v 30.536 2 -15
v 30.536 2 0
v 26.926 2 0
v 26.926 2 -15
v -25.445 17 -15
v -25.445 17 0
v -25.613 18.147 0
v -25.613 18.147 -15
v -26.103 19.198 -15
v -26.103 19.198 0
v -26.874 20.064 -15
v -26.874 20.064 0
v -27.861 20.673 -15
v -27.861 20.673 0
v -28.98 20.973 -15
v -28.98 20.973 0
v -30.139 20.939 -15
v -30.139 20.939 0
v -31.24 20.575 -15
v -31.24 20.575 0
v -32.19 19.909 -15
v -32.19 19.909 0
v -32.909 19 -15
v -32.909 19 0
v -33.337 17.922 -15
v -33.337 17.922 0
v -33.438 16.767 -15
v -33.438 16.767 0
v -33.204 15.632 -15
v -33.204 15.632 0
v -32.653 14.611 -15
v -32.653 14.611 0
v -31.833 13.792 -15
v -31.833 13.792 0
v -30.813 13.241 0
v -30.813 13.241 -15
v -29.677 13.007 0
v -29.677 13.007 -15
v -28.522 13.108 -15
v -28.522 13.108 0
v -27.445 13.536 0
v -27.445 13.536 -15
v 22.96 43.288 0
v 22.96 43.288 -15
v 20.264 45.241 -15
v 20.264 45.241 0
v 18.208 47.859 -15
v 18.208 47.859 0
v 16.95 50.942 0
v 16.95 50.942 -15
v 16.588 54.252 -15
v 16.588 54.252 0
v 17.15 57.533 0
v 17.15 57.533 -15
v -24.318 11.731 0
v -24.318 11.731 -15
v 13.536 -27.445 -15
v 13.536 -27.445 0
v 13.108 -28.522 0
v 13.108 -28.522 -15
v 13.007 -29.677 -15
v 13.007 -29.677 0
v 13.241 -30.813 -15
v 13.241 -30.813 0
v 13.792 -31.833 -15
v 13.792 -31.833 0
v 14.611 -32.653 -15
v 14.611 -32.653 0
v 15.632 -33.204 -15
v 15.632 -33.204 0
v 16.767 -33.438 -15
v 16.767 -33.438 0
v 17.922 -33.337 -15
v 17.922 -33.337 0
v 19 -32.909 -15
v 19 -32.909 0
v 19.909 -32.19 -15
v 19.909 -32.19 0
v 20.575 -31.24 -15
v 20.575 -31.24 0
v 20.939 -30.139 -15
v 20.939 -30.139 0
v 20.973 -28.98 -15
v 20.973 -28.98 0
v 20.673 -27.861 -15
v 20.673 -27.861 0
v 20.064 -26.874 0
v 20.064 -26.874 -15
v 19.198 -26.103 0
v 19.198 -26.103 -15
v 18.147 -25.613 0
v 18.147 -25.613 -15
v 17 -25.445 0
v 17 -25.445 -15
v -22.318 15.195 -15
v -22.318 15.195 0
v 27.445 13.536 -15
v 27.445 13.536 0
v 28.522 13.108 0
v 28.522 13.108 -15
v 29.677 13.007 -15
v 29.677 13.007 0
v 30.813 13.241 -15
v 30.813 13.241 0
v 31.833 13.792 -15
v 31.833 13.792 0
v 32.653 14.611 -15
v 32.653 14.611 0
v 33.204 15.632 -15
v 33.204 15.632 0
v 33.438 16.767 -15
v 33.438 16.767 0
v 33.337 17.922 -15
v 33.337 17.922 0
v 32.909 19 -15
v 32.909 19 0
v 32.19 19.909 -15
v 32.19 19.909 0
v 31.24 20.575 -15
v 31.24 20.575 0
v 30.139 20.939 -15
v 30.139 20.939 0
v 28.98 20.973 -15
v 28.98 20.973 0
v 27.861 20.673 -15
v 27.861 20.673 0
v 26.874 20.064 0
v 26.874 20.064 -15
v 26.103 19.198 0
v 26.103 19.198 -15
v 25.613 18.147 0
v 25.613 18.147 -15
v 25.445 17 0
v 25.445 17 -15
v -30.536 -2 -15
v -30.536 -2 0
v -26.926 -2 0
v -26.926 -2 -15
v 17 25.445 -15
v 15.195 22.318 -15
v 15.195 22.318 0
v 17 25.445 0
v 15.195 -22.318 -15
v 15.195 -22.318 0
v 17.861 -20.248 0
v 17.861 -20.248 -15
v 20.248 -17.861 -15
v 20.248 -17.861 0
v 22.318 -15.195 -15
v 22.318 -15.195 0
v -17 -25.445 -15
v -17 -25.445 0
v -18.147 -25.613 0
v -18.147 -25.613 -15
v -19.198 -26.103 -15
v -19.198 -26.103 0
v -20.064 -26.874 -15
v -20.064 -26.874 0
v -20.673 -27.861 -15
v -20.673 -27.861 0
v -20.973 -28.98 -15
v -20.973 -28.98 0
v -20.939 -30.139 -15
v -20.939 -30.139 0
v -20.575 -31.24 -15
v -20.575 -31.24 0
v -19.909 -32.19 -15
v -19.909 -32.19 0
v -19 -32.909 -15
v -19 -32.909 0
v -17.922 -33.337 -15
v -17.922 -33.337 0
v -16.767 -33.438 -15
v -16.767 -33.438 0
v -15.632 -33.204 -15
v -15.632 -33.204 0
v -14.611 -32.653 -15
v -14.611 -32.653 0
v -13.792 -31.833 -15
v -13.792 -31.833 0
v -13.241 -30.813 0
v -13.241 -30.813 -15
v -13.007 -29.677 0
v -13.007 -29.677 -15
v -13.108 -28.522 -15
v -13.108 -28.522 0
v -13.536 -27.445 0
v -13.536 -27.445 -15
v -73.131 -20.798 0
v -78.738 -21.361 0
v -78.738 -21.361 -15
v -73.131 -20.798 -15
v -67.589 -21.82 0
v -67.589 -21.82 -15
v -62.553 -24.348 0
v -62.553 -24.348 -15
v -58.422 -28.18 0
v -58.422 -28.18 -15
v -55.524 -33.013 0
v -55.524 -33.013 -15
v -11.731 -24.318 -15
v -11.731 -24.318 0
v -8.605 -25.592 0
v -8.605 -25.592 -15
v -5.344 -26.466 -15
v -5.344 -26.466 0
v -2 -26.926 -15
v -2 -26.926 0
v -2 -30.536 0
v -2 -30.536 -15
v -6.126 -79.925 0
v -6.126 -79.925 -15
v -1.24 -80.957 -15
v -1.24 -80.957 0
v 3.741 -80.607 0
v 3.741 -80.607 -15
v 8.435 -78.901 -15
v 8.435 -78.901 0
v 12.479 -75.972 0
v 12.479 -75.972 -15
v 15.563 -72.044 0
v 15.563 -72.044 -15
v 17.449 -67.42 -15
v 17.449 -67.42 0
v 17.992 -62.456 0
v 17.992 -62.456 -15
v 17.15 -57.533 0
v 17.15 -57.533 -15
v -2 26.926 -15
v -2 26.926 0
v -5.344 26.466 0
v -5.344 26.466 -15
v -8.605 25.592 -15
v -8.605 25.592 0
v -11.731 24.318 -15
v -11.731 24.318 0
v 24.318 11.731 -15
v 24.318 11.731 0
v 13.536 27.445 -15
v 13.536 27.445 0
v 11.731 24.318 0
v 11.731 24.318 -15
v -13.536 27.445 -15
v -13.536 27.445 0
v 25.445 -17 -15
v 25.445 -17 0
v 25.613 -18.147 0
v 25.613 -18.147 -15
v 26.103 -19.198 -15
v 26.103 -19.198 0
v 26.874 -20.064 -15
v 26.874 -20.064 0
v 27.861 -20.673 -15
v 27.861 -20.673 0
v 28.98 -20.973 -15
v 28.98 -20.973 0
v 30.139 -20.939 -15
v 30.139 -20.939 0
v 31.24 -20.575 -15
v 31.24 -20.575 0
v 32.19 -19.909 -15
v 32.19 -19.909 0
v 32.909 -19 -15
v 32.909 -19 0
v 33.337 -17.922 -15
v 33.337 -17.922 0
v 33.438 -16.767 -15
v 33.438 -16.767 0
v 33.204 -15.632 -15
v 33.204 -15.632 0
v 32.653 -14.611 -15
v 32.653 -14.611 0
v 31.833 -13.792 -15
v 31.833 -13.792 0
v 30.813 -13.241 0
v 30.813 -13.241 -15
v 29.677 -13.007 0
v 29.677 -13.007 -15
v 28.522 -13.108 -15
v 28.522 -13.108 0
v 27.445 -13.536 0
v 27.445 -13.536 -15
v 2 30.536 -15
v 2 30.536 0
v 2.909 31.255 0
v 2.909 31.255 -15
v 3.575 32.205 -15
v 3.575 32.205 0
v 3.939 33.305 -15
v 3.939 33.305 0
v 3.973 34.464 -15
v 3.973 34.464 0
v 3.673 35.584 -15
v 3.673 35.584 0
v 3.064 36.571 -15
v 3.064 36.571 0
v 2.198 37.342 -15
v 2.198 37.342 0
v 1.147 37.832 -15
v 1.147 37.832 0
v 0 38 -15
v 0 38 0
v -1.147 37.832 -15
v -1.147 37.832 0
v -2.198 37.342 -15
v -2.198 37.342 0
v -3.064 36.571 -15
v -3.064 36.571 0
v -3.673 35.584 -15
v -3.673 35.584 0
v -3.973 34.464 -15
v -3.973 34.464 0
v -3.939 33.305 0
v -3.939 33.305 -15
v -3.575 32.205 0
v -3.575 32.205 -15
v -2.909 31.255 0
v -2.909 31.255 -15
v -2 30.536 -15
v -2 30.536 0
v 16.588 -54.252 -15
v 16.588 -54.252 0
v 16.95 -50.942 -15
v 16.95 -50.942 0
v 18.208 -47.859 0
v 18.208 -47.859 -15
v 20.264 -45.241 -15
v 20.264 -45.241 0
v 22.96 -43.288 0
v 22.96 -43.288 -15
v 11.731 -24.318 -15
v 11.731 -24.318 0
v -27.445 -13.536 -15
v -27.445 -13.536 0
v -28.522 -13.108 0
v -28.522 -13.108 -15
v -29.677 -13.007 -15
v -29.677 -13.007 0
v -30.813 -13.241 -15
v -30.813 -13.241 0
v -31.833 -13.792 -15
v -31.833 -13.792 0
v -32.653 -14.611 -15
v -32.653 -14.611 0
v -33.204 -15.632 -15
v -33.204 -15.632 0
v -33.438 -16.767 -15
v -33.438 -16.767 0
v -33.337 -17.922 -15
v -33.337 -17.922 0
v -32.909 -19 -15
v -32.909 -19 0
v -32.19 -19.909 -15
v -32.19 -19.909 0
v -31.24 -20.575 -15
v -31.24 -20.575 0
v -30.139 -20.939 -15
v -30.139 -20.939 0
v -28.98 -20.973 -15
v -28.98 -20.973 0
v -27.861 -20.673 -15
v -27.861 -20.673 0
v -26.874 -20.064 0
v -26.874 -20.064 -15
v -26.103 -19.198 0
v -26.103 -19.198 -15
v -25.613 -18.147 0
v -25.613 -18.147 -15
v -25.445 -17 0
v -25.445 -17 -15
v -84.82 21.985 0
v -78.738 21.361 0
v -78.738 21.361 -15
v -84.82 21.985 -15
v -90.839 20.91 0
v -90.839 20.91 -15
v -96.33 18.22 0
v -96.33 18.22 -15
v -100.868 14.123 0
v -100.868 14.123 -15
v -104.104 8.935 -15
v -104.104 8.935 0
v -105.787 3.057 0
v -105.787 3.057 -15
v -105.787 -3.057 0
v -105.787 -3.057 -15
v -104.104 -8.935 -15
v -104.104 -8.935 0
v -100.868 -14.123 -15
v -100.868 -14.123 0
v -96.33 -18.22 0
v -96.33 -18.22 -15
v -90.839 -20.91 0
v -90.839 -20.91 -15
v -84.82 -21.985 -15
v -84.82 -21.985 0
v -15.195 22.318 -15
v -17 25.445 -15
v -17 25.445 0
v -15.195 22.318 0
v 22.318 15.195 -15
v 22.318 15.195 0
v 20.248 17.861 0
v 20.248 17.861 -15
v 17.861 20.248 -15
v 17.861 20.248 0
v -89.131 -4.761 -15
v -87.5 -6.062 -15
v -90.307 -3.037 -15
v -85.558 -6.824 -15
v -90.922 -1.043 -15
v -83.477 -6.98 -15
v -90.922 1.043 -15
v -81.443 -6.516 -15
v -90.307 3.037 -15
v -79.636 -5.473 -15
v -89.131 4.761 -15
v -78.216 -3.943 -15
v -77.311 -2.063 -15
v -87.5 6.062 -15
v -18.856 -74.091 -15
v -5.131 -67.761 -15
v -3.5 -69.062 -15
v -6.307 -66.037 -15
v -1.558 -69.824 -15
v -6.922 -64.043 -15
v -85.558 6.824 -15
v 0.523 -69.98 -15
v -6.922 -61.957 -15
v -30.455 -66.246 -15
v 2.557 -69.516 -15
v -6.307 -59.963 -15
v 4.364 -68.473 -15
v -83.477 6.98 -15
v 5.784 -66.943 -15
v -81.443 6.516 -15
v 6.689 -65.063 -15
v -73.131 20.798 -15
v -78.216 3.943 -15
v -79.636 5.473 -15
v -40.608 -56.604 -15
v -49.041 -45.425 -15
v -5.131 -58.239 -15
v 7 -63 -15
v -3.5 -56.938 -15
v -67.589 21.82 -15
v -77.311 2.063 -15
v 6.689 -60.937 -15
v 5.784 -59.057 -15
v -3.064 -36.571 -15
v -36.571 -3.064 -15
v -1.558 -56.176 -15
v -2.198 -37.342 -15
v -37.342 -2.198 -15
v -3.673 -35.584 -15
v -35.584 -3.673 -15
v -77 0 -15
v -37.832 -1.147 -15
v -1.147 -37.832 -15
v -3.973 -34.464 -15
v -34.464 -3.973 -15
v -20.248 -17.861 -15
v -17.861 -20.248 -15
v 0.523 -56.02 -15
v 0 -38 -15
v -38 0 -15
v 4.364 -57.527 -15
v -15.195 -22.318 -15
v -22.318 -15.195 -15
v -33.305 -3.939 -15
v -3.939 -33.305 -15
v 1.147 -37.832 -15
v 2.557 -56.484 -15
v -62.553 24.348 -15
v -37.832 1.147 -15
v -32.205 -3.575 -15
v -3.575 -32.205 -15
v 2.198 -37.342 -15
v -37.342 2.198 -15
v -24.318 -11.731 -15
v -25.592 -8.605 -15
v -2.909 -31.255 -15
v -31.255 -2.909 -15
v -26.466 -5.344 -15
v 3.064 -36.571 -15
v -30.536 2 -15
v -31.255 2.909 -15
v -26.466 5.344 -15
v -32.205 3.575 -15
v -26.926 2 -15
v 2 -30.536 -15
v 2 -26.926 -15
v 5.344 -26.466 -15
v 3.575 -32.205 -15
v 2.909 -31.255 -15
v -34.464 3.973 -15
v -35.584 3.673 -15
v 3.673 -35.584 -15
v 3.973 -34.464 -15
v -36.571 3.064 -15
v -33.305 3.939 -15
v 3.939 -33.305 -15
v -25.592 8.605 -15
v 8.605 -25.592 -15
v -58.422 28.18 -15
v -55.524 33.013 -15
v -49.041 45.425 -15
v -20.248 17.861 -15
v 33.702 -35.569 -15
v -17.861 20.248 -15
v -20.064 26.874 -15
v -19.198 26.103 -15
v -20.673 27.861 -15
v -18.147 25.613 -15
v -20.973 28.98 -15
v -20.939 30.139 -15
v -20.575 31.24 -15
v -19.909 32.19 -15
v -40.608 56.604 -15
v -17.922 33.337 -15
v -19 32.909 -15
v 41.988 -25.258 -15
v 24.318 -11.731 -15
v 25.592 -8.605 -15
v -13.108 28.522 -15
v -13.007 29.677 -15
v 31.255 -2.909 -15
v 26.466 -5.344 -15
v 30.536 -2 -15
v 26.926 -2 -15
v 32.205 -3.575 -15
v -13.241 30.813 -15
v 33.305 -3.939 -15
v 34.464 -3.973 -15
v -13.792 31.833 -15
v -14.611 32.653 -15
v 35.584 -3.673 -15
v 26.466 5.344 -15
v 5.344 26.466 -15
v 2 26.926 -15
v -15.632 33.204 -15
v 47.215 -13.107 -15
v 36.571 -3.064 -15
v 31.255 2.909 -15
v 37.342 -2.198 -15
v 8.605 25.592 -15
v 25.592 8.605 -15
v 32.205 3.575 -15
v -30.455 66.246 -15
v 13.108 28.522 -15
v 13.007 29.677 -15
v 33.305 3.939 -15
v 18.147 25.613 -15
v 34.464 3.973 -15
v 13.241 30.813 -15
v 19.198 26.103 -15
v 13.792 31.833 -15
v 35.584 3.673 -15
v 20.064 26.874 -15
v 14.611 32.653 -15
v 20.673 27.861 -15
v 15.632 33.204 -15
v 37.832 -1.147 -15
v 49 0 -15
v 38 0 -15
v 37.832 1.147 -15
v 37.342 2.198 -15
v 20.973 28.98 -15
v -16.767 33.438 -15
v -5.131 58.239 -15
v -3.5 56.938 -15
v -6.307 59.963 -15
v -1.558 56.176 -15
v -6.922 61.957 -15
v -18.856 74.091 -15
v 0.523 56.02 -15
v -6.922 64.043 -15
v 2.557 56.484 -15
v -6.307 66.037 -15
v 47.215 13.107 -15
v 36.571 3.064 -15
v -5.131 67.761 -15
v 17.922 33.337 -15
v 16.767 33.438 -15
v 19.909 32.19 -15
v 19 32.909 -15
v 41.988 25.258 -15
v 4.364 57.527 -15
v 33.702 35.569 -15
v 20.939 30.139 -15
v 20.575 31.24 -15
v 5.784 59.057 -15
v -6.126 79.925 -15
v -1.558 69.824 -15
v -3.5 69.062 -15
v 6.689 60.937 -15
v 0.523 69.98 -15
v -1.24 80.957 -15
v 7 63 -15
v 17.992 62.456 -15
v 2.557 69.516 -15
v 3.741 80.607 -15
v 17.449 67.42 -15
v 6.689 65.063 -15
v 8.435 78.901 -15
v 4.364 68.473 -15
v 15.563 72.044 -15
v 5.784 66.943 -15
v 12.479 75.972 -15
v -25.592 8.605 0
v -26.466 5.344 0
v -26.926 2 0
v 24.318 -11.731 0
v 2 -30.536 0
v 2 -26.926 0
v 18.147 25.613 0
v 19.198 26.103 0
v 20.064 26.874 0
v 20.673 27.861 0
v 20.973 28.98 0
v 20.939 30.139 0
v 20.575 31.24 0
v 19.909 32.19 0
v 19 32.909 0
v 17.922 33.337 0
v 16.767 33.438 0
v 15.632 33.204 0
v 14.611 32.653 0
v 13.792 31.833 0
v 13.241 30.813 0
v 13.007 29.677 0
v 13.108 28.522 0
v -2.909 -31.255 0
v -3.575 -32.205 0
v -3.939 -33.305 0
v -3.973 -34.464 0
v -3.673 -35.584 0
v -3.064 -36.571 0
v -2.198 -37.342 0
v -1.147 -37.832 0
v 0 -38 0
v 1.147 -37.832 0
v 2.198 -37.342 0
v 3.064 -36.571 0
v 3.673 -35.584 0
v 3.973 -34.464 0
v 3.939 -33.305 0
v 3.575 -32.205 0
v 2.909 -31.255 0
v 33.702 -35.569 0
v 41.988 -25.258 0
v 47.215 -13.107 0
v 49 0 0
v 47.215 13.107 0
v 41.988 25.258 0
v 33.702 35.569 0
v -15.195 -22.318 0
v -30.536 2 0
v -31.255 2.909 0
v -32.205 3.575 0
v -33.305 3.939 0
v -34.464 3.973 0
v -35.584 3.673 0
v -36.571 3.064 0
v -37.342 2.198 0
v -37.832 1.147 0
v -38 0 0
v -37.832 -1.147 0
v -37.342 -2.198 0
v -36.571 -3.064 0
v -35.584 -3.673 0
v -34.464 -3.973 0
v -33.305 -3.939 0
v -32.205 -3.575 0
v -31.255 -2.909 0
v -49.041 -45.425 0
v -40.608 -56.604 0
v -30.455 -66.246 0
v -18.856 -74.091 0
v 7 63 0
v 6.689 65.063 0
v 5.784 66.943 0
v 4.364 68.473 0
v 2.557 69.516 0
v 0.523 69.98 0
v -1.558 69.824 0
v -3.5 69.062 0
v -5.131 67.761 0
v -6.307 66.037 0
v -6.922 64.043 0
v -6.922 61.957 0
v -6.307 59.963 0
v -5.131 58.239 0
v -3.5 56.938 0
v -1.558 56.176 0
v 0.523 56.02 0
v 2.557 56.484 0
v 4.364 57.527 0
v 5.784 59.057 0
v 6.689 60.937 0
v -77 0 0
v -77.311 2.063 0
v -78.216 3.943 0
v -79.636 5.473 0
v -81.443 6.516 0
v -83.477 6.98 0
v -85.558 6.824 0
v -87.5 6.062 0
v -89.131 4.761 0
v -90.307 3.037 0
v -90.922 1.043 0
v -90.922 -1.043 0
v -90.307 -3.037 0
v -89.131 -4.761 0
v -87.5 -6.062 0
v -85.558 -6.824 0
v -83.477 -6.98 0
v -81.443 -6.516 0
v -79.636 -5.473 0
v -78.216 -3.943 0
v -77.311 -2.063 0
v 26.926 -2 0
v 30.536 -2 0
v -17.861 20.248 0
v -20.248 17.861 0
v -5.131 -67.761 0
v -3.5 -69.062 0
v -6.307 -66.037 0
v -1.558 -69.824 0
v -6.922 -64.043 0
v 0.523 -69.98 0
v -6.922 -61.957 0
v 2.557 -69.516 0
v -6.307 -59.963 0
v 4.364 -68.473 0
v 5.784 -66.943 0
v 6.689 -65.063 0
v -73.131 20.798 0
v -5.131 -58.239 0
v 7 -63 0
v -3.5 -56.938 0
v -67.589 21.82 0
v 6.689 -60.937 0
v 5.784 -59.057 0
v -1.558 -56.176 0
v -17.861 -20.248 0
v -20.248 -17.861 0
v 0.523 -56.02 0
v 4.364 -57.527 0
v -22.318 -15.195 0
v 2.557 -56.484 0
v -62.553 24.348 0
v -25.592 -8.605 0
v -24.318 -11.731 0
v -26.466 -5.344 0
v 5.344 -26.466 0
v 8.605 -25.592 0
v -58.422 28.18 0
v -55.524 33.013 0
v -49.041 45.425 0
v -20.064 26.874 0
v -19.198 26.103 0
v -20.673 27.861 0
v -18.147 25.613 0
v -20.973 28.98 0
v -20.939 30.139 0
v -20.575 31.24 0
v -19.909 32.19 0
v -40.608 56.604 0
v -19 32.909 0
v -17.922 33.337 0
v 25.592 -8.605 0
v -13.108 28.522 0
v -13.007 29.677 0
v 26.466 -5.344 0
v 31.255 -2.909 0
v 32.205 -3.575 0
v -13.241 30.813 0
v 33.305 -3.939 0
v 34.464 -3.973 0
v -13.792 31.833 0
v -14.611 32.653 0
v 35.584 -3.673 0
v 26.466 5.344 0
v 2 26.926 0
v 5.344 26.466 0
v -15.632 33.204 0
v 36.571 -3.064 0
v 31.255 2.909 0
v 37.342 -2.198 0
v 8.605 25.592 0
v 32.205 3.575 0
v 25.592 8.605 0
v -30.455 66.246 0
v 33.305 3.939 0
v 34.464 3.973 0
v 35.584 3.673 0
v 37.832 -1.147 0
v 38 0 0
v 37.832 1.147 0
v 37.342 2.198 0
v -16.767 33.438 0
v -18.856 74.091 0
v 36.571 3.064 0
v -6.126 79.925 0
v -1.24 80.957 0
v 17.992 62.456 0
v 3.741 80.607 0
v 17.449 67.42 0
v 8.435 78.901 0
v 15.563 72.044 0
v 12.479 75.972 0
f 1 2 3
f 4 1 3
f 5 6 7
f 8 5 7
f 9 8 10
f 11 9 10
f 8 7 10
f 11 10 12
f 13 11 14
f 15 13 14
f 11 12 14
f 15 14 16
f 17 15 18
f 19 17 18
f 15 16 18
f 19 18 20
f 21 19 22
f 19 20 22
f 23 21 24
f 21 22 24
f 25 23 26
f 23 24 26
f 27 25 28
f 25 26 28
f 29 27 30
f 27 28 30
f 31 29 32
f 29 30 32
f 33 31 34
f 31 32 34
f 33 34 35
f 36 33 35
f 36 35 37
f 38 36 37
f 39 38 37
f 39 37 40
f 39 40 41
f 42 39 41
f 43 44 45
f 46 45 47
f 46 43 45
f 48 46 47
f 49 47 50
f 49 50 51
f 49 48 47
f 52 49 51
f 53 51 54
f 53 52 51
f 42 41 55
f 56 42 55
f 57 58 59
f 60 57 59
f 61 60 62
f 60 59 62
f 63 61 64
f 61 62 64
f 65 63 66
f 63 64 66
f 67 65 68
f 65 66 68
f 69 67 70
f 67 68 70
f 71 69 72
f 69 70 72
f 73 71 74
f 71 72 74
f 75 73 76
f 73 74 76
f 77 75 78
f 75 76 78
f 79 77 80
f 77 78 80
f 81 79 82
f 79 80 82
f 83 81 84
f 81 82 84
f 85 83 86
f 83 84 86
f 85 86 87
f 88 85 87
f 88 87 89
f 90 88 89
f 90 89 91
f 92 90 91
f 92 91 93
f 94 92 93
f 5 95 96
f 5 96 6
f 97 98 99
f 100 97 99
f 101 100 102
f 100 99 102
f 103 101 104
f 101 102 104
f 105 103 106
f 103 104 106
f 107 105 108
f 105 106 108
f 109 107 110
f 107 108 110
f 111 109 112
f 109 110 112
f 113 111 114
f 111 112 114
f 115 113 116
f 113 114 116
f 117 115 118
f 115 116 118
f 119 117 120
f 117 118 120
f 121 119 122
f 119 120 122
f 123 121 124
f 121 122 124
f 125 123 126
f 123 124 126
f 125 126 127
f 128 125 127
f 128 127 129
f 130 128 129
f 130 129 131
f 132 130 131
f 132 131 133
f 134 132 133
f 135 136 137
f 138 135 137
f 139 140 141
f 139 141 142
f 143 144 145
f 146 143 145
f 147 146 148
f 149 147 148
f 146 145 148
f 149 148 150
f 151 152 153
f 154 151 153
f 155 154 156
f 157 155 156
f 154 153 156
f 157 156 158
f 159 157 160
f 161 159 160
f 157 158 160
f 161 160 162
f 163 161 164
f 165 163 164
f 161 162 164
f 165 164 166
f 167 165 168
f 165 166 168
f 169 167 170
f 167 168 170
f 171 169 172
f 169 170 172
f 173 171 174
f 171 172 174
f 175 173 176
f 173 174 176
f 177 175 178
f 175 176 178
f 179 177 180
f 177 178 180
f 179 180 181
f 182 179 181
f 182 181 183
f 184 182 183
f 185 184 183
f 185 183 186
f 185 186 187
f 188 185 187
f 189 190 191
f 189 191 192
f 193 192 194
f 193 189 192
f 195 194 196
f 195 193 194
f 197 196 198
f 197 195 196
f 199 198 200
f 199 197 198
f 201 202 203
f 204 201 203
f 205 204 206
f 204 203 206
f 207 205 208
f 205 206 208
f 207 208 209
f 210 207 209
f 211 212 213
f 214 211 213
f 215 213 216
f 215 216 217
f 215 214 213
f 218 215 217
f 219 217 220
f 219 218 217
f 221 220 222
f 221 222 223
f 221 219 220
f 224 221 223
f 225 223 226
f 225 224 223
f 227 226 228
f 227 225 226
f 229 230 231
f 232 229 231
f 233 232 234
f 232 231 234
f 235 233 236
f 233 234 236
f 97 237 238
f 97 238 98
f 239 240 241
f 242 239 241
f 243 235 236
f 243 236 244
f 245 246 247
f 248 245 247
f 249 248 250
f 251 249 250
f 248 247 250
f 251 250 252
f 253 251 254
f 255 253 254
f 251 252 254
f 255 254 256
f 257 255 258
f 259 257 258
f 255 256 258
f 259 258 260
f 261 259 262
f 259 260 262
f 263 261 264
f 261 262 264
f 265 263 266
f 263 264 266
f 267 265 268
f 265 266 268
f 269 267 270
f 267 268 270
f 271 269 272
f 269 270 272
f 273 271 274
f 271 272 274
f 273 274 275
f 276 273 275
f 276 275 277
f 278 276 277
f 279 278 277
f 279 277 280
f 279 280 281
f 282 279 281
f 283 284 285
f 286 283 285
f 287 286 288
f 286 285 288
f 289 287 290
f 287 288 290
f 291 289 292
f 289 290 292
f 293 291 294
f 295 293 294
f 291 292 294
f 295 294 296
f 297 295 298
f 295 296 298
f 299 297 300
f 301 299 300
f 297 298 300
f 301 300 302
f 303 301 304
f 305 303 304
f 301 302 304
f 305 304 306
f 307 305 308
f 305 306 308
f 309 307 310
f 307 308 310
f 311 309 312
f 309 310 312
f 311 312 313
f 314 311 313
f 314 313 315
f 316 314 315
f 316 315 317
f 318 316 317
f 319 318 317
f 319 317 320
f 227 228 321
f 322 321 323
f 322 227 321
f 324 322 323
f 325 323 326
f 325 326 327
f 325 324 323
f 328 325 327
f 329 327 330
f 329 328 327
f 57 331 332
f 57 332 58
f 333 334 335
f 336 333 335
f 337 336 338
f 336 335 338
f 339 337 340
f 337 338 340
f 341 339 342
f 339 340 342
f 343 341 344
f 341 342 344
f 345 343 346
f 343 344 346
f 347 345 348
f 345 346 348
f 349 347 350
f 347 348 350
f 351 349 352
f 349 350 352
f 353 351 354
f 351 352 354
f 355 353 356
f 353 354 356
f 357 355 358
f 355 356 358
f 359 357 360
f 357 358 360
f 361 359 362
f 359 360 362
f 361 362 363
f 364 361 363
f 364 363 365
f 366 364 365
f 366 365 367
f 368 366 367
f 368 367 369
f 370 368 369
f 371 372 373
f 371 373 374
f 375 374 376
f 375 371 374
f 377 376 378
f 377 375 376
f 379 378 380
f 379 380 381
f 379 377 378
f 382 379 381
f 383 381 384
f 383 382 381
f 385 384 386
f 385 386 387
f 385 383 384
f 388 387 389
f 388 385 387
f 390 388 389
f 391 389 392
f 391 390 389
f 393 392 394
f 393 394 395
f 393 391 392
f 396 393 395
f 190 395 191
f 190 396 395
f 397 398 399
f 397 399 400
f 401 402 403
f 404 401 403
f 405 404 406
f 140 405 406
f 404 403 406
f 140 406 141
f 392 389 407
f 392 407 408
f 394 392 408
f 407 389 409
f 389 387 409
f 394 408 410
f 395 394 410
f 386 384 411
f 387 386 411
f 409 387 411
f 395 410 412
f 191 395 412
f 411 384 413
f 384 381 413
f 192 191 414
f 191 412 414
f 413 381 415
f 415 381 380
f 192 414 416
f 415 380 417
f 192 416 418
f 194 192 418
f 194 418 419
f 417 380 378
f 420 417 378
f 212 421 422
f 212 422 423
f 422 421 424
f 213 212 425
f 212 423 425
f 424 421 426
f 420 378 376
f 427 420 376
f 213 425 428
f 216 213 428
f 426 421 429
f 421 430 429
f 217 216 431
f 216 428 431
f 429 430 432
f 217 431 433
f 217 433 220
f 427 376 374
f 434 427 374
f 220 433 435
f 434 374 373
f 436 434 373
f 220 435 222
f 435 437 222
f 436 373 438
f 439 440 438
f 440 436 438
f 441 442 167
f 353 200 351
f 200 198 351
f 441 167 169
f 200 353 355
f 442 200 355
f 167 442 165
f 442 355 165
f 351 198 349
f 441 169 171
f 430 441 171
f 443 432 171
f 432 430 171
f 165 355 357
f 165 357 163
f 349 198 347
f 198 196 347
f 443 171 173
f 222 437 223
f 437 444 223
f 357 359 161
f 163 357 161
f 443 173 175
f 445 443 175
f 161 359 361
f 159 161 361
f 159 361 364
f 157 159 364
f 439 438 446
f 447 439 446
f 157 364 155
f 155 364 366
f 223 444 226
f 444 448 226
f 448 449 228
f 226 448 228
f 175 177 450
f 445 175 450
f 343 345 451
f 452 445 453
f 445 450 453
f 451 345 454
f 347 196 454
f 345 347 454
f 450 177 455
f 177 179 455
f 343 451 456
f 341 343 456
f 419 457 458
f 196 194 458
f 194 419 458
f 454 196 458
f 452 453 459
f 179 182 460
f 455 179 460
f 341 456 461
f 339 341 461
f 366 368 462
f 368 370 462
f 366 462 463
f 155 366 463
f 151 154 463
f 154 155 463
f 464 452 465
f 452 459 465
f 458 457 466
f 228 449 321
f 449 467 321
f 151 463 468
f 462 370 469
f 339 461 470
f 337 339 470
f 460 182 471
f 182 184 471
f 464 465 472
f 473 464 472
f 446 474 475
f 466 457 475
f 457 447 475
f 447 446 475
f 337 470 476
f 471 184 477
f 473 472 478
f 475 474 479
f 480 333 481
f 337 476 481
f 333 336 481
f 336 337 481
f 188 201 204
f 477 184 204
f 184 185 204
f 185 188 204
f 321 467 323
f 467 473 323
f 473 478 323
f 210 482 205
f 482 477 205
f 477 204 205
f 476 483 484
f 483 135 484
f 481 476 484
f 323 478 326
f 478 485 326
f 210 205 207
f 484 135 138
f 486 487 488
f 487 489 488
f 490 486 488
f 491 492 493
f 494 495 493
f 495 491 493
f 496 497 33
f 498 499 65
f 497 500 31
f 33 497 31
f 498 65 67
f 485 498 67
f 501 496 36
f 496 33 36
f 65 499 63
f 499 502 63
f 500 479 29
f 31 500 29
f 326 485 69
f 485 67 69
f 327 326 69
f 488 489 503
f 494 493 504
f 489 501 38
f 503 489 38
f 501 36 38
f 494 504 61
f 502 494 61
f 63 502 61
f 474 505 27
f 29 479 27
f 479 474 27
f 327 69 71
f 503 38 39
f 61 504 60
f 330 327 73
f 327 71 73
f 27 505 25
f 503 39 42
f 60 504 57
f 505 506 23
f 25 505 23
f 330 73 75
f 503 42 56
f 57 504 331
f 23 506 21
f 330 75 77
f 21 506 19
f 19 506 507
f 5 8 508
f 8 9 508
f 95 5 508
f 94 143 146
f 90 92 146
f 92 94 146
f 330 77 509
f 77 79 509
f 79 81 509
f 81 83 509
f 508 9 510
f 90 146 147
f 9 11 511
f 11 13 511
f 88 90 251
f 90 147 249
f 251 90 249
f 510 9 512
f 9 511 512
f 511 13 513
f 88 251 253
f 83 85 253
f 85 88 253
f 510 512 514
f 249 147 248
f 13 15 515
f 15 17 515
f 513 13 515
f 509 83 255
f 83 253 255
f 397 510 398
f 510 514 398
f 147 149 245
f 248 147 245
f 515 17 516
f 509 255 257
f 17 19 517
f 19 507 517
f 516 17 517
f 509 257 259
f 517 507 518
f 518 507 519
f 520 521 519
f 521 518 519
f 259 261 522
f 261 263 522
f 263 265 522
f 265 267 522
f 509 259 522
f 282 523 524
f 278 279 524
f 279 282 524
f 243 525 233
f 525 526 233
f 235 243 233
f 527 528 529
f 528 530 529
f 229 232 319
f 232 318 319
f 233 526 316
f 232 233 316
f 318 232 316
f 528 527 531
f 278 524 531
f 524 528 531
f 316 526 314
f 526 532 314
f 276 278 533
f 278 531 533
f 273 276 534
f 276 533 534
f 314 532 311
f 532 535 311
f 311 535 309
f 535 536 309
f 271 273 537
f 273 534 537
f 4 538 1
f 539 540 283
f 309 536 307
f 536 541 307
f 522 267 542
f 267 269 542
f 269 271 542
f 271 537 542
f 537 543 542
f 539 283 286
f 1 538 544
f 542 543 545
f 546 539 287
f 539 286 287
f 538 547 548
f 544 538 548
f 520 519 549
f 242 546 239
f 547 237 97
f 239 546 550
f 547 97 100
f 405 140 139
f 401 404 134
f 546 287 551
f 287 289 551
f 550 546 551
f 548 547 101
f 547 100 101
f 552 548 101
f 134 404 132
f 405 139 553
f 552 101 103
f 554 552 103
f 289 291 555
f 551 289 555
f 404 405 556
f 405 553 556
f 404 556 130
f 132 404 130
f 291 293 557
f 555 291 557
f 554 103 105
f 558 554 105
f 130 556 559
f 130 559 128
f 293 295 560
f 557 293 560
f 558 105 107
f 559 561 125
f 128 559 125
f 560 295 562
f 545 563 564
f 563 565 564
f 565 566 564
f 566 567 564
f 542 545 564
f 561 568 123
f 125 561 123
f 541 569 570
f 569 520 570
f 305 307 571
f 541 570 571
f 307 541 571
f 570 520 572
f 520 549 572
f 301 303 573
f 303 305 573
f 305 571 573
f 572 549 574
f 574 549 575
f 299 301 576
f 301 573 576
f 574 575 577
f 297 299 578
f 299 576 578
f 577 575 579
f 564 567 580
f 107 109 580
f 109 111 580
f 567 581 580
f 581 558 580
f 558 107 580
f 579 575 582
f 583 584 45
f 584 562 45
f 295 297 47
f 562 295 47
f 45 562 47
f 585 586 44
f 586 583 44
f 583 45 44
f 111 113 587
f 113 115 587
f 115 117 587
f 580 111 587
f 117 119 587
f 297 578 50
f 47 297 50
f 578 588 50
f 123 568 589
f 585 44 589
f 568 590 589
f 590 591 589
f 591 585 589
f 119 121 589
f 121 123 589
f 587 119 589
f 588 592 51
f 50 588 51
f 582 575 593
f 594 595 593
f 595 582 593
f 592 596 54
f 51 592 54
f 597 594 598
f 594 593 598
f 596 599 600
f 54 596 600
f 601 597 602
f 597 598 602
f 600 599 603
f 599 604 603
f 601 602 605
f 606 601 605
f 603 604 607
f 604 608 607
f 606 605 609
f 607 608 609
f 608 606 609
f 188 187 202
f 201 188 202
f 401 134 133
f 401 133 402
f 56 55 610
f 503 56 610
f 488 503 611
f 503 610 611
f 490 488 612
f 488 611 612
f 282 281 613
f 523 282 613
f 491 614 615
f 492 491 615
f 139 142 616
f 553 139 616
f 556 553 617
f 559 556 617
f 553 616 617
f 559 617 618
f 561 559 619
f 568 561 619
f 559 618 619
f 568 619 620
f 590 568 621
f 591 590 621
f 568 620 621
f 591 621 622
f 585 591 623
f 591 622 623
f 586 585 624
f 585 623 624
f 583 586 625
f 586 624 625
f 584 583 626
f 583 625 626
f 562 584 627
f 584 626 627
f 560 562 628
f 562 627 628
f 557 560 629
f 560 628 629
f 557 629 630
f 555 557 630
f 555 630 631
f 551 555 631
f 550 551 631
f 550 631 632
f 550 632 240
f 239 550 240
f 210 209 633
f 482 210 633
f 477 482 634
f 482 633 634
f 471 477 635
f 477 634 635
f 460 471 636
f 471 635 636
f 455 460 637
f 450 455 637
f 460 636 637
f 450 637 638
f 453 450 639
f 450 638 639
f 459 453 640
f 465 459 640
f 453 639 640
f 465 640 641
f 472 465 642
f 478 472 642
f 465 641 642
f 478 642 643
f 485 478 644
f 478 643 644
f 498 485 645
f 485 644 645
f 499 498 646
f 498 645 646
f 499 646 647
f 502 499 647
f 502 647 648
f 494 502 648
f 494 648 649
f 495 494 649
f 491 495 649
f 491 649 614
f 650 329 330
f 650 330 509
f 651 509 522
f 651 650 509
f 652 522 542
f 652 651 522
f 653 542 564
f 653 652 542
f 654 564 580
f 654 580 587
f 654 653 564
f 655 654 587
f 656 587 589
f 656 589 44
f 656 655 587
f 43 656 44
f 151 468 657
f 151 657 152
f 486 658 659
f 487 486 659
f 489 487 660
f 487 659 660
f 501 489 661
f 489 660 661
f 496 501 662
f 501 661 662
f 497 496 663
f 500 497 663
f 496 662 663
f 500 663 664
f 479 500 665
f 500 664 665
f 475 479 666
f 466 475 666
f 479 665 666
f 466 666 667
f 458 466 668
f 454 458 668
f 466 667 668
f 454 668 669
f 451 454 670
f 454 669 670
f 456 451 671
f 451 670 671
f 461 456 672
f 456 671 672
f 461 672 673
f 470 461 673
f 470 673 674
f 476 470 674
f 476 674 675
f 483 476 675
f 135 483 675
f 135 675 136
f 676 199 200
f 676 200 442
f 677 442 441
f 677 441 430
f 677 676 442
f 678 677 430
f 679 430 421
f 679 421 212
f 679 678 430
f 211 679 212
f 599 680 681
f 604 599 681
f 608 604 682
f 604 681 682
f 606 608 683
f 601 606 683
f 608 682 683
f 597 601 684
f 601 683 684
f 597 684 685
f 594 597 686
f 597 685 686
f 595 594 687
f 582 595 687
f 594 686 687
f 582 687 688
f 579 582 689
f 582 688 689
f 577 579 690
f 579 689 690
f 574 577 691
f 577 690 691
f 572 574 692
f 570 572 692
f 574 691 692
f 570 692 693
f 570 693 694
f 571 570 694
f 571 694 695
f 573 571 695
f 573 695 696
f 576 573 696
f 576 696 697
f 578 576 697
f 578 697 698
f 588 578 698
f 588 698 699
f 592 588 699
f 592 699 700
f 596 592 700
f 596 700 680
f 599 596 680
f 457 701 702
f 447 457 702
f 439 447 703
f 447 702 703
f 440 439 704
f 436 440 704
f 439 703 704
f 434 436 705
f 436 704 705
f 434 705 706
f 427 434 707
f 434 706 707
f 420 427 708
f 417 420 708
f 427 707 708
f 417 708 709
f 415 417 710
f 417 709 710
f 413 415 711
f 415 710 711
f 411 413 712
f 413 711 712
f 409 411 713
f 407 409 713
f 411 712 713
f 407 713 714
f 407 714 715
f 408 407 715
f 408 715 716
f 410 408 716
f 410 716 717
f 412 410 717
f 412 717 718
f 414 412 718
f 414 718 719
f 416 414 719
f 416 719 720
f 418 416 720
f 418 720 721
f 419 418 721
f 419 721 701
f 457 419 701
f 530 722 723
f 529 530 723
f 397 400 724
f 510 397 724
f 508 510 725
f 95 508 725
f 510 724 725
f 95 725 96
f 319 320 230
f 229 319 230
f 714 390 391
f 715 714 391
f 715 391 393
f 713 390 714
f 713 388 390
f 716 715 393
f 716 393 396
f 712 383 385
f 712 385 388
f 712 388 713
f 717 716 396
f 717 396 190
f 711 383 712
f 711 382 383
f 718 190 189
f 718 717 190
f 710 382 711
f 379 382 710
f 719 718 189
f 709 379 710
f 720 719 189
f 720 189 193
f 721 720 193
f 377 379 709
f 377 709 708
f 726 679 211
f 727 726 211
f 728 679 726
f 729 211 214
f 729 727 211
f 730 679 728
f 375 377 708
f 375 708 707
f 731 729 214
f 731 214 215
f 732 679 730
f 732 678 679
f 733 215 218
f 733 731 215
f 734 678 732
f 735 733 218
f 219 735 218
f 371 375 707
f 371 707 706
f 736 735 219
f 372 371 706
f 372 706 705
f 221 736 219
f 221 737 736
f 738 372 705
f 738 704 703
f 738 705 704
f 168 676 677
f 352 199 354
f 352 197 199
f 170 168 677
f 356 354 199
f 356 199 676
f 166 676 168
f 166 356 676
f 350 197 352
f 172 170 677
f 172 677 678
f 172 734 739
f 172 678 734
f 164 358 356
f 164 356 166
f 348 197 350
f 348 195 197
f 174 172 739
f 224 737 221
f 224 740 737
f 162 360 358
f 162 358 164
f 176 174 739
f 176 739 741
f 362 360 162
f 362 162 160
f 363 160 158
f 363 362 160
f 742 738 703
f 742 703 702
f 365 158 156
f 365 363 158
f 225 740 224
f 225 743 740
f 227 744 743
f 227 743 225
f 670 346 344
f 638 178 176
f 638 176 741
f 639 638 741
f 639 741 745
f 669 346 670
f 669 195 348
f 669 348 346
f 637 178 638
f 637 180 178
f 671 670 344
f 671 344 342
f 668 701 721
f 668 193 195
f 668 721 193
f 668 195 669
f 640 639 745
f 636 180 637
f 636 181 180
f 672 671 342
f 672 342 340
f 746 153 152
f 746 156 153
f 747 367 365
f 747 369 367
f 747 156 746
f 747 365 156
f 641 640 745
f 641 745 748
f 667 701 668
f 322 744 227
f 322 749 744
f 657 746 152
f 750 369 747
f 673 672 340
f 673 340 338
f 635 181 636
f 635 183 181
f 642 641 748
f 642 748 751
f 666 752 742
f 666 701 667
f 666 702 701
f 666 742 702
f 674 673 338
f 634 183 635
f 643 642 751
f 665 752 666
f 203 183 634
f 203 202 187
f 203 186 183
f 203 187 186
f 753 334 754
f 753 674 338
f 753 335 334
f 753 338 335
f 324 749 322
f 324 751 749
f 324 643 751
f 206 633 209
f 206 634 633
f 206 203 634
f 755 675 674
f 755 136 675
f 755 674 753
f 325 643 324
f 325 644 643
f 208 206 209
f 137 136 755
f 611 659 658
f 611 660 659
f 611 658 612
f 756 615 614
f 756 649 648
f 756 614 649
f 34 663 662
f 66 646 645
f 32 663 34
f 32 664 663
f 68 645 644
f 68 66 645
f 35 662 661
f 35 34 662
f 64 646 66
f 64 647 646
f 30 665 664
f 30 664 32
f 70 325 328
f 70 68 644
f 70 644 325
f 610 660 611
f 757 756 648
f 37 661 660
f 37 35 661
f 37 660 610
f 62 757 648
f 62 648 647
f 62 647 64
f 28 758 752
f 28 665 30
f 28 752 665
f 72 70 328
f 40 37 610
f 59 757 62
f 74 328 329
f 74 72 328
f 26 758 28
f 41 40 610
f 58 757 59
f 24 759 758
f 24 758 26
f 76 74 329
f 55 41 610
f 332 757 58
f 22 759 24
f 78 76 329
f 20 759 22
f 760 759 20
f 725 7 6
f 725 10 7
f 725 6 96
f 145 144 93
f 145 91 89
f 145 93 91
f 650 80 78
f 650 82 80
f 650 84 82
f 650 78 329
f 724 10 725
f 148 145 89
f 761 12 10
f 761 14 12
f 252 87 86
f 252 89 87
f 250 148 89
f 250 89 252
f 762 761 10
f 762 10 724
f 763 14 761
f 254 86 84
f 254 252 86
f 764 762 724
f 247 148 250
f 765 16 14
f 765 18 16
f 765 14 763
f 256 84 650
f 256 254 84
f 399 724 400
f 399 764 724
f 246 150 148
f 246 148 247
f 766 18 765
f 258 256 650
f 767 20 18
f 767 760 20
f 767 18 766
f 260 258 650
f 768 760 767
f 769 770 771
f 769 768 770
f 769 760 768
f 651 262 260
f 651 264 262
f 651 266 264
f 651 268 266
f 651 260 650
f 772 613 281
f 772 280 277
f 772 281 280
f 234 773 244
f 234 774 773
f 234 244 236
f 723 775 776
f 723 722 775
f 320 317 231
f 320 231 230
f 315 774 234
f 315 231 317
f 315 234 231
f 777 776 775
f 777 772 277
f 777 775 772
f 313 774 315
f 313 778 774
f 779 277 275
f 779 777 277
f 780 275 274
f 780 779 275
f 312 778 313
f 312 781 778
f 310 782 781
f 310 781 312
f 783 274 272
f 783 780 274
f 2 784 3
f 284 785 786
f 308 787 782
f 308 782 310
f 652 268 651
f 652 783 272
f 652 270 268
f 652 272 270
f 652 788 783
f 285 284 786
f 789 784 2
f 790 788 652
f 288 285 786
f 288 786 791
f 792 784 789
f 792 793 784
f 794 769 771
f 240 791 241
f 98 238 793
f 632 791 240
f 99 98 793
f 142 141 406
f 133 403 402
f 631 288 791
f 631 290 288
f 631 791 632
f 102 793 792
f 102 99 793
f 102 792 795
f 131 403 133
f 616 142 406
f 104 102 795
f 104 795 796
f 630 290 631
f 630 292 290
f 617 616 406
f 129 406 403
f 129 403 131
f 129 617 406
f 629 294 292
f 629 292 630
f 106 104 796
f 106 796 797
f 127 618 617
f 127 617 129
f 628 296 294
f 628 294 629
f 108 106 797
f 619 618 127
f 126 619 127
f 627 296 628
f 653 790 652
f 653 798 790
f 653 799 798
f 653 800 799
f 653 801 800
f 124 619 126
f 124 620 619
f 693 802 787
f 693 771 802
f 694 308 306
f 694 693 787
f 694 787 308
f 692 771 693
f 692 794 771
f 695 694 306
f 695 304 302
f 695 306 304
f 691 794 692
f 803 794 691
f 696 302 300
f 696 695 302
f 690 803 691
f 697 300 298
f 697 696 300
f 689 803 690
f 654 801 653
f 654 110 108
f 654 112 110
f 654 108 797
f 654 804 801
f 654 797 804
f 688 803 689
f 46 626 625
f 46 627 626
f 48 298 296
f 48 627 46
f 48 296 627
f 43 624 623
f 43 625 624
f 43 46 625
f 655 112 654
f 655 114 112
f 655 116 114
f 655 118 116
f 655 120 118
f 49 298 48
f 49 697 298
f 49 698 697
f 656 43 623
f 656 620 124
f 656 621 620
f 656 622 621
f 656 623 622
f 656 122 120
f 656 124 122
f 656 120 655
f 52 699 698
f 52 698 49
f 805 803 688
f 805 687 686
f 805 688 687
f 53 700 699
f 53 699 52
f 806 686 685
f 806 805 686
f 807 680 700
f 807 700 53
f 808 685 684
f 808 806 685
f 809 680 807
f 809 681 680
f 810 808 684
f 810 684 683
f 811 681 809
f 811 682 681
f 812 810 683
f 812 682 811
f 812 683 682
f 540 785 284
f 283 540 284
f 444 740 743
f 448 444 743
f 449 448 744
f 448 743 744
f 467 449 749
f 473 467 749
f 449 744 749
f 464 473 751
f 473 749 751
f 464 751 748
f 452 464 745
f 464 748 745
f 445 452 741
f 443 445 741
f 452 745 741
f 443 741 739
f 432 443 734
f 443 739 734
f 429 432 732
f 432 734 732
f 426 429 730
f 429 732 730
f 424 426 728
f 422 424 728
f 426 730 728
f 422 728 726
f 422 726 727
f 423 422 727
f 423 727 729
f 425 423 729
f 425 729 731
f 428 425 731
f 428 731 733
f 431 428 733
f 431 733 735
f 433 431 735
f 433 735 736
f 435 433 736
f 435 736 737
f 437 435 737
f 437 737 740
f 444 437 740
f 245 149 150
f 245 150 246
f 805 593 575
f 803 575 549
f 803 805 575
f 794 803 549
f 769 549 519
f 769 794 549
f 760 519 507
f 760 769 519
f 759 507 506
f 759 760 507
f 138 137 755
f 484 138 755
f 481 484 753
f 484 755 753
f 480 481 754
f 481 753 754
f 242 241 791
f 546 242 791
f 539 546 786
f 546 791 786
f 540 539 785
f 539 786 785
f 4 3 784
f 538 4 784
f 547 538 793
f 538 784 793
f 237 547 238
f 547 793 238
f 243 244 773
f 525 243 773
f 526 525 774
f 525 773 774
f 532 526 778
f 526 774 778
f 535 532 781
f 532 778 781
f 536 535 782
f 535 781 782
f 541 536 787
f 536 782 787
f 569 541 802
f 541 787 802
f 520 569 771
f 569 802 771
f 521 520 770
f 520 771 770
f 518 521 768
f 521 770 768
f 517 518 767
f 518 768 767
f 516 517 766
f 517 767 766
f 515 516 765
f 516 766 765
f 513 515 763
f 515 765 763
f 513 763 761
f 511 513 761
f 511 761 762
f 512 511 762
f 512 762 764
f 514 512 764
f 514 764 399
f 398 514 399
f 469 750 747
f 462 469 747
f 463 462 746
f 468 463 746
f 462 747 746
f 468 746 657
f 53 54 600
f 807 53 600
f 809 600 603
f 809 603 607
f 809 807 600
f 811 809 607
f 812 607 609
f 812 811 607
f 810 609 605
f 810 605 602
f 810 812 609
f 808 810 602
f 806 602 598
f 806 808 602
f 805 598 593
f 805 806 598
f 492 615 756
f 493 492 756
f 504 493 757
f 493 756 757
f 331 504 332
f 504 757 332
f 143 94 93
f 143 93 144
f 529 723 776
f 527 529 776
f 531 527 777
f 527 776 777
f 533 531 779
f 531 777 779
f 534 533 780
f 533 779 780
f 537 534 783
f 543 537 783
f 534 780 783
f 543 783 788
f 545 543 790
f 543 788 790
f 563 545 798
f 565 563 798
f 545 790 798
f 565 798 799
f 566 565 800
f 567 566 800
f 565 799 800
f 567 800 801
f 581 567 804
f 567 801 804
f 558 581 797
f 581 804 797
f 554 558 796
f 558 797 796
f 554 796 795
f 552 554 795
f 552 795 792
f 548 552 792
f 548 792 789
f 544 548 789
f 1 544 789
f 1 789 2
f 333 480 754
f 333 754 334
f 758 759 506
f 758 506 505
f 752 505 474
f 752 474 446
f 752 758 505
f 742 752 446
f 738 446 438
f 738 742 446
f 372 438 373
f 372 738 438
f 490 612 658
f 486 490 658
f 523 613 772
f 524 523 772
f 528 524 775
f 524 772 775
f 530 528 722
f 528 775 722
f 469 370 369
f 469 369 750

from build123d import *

# Parameters (mm, degrees)
SALIENTE_EXTRUIR1_DEPTH = 15
CROQUIS2_R              = 7
CORTAR_EXTRUIR1_DEPTH   = 135.246042772


with BuildPart() as part:
    # Croquis1 → Saliente-Extruir1 (new body)
    with BuildSketch(Plane.XY):
        with BuildLine():
            ThreePointArc((22.960111456, -43.287795993), (49, 0), (22.960111456, 43.287795993))
            ThreePointArc((22.960111456, 43.287795993), (17.471680778, 49.356927241), (17.149797537, 57.533333333))
            ThreePointArc((17.149797537, 57.533333333), (12.479188654, 75.97188693), (-6.126315717, 79.925373134))
            ThreePointArc((-6.126315717, 79.925373134), (-35.730309716, 61.63434209), (-55.523644659, 33.012983471))
            ThreePointArc((-55.523644659, 33.012983471), (-64.981782963, 22.905981014), (-78.737580645, 21.361342246))
            ThreePointArc((-78.737580645, 21.361342246), (-106, 0), (-78.737580645, -21.361342246))
            ThreePointArc((-78.737580645, -21.361342246), (-64.981782963, -22.905981014), (-55.523644659, -33.012983471))
            ThreePointArc((-55.523644659, -33.012983471), (-35.730309716, -61.63434209), (-6.126315717, -79.925373134))
            ThreePointArc((-6.126315717, -79.925373134), (12.479188654, -75.97188693), (17.149797537, -57.533333333))
            ThreePointArc((17.149797537, -57.533333333), (17.471680778, -49.356927241), (22.960111456, -43.287795993))
        make_face()
    extrude(amount=-SALIENTE_EXTRUIR1_DEPTH)

    # Croquis2 → Cortar-Extruir1 (cut, through all)
    with BuildSketch(Plane.XY):
        with Locations((0, 63)):
            Circle(CROQUIS2_R)
        with Locations((-84, 0)):
            Circle(CROQUIS2_R)
        with Locations((0, -63)):
            Circle(CROQUIS2_R)
        with BuildLine():
            Line((-2, 30.535898385), (-2, 26.925824036))
            ThreePointArc((-2, 26.925824036), (-6.988114218, 26.07999731), (-11.73086121, 24.318447633))
            Line((-11.73086121, 24.318447633), (-13.535898385, 27.444863729))
            ThreePointArc((-13.535898385, 27.444863729), (-19, 32.908965344), (-17, 25.444863729))
            Line((-17, 25.444863729), (-15.194962825, 22.318447633))
            ThreePointArc((-15.194962825, 22.318447633), (-19.091883092, 19.091883092), (-22.318447633, 15.194962825))
            Line((-22.318447633, 15.194962825), (-25.444863729, 17))
            ThreePointArc((-25.444863729, 17), (-32.908965344, 19), (-27.444863729, 13.535898385))
            Line((-27.444863729, 13.535898385), (-24.318447633, 11.73086121))
            ThreePointArc((-24.318447633, 11.73086121), (-26.07999731, 6.988114218), (-26.925824036, 2))
            Line((-26.925824036, 2), (-30.535898385, 2))
            ThreePointArc((-30.535898385, 2), (-38, 0), (-30.535898385, -2))
            Line((-30.535898385, -2), (-26.925824036, -2))
            ThreePointArc((-26.925824036, -2), (-26.07999731, -6.988114218), (-24.318447633, -11.73086121))
            Line((-24.318447633, -11.73086121), (-27.444863729, -13.535898385))
            ThreePointArc((-27.444863729, -13.535898385), (-32.908965344, -19), (-25.444863729, -17))
            Line((-25.444863729, -17), (-22.318447633, -15.194962825))
            ThreePointArc((-22.318447633, -15.194962825), (-19.091883092, -19.091883092), (-15.194962825, -22.318447633))
            Line((-15.194962825, -22.318447633), (-17, -25.444863729))
            ThreePointArc((-17, -25.444863729), (-19, -32.908965344), (-13.535898385, -27.444863729))
            Line((-13.535898385, -27.444863729), (-11.73086121, -24.318447633))
            ThreePointArc((-11.73086121, -24.318447633), (-6.988114218, -26.07999731), (-2, -26.925824036))
            Line((-2, -26.925824036), (-2, -30.535898385))
            ThreePointArc((-2, -30.535898385), (0, -38), (2, -30.535898385))
            Line((2, -30.535898385), (2, -26.925824036))
            ThreePointArc((2, -26.925824036), (6.988114218, -26.07999731), (11.73086121, -24.318447633))
            Line((11.73086121, -24.318447633), (13.535898385, -27.444863729))
            ThreePointArc((13.535898385, -27.444863729), (19, -32.908965344), (17, -25.444863729))
            Line((17, -25.444863729), (15.194962825, -22.318447633))
            ThreePointArc((15.194962825, -22.318447633), (19.091883092, -19.091883092), (22.318447633, -15.194962825))
            Line((22.318447633, -15.194962825), (25.444863729, -17))
            ThreePointArc((25.444863729, -17), (32.908965344, -19), (27.444863729, -13.535898385))
            Line((27.444863729, -13.535898385), (24.318447633, -11.73086121))
            ThreePointArc((24.318447633, -11.73086121), (26.07999731, -6.988114218), (26.925824036, -2))
            Line((26.925824036, -2), (30.535898385, -2))
            ThreePointArc((30.535898385, -2), (38, 0), (30.535898385, 2))
            Line((30.535898385, 2), (26.925824036, 2))
            ThreePointArc((26.925824036, 2), (26.07999731, 6.988114218), (24.318447633, 11.73086121))
            Line((24.318447633, 11.73086121), (27.444863729, 13.535898385))
            ThreePointArc((27.444863729, 13.535898385), (32.908965344, 19), (25.444863729, 17))
            Line((25.444863729, 17), (22.318447633, 15.194962825))
            ThreePointArc((22.318447633, 15.194962825), (19.091883092, 19.091883092), (15.194962825, 22.318447633))
            Line((15.194962825, 22.318447633), (17, 25.444863729))
            ThreePointArc((17, 25.444863729), (19, 32.908965344), (13.535898385, 27.444863729))
            Line((13.535898385, 27.444863729), (11.73086121, 24.318447633))
            ThreePointArc((11.73086121, 24.318447633), (6.988114218, 26.07999731), (2, 26.925824036))
            Line((2, 26.925824036), (2, 30.535898385))
            ThreePointArc((2, 30.535898385), (0, 38), (-2, 30.535898385))
        make_face()
    extrude(amount=-CORTAR_EXTRUIR1_DEPTH, mode=Mode.SUBTRACT)


solid = part.part
